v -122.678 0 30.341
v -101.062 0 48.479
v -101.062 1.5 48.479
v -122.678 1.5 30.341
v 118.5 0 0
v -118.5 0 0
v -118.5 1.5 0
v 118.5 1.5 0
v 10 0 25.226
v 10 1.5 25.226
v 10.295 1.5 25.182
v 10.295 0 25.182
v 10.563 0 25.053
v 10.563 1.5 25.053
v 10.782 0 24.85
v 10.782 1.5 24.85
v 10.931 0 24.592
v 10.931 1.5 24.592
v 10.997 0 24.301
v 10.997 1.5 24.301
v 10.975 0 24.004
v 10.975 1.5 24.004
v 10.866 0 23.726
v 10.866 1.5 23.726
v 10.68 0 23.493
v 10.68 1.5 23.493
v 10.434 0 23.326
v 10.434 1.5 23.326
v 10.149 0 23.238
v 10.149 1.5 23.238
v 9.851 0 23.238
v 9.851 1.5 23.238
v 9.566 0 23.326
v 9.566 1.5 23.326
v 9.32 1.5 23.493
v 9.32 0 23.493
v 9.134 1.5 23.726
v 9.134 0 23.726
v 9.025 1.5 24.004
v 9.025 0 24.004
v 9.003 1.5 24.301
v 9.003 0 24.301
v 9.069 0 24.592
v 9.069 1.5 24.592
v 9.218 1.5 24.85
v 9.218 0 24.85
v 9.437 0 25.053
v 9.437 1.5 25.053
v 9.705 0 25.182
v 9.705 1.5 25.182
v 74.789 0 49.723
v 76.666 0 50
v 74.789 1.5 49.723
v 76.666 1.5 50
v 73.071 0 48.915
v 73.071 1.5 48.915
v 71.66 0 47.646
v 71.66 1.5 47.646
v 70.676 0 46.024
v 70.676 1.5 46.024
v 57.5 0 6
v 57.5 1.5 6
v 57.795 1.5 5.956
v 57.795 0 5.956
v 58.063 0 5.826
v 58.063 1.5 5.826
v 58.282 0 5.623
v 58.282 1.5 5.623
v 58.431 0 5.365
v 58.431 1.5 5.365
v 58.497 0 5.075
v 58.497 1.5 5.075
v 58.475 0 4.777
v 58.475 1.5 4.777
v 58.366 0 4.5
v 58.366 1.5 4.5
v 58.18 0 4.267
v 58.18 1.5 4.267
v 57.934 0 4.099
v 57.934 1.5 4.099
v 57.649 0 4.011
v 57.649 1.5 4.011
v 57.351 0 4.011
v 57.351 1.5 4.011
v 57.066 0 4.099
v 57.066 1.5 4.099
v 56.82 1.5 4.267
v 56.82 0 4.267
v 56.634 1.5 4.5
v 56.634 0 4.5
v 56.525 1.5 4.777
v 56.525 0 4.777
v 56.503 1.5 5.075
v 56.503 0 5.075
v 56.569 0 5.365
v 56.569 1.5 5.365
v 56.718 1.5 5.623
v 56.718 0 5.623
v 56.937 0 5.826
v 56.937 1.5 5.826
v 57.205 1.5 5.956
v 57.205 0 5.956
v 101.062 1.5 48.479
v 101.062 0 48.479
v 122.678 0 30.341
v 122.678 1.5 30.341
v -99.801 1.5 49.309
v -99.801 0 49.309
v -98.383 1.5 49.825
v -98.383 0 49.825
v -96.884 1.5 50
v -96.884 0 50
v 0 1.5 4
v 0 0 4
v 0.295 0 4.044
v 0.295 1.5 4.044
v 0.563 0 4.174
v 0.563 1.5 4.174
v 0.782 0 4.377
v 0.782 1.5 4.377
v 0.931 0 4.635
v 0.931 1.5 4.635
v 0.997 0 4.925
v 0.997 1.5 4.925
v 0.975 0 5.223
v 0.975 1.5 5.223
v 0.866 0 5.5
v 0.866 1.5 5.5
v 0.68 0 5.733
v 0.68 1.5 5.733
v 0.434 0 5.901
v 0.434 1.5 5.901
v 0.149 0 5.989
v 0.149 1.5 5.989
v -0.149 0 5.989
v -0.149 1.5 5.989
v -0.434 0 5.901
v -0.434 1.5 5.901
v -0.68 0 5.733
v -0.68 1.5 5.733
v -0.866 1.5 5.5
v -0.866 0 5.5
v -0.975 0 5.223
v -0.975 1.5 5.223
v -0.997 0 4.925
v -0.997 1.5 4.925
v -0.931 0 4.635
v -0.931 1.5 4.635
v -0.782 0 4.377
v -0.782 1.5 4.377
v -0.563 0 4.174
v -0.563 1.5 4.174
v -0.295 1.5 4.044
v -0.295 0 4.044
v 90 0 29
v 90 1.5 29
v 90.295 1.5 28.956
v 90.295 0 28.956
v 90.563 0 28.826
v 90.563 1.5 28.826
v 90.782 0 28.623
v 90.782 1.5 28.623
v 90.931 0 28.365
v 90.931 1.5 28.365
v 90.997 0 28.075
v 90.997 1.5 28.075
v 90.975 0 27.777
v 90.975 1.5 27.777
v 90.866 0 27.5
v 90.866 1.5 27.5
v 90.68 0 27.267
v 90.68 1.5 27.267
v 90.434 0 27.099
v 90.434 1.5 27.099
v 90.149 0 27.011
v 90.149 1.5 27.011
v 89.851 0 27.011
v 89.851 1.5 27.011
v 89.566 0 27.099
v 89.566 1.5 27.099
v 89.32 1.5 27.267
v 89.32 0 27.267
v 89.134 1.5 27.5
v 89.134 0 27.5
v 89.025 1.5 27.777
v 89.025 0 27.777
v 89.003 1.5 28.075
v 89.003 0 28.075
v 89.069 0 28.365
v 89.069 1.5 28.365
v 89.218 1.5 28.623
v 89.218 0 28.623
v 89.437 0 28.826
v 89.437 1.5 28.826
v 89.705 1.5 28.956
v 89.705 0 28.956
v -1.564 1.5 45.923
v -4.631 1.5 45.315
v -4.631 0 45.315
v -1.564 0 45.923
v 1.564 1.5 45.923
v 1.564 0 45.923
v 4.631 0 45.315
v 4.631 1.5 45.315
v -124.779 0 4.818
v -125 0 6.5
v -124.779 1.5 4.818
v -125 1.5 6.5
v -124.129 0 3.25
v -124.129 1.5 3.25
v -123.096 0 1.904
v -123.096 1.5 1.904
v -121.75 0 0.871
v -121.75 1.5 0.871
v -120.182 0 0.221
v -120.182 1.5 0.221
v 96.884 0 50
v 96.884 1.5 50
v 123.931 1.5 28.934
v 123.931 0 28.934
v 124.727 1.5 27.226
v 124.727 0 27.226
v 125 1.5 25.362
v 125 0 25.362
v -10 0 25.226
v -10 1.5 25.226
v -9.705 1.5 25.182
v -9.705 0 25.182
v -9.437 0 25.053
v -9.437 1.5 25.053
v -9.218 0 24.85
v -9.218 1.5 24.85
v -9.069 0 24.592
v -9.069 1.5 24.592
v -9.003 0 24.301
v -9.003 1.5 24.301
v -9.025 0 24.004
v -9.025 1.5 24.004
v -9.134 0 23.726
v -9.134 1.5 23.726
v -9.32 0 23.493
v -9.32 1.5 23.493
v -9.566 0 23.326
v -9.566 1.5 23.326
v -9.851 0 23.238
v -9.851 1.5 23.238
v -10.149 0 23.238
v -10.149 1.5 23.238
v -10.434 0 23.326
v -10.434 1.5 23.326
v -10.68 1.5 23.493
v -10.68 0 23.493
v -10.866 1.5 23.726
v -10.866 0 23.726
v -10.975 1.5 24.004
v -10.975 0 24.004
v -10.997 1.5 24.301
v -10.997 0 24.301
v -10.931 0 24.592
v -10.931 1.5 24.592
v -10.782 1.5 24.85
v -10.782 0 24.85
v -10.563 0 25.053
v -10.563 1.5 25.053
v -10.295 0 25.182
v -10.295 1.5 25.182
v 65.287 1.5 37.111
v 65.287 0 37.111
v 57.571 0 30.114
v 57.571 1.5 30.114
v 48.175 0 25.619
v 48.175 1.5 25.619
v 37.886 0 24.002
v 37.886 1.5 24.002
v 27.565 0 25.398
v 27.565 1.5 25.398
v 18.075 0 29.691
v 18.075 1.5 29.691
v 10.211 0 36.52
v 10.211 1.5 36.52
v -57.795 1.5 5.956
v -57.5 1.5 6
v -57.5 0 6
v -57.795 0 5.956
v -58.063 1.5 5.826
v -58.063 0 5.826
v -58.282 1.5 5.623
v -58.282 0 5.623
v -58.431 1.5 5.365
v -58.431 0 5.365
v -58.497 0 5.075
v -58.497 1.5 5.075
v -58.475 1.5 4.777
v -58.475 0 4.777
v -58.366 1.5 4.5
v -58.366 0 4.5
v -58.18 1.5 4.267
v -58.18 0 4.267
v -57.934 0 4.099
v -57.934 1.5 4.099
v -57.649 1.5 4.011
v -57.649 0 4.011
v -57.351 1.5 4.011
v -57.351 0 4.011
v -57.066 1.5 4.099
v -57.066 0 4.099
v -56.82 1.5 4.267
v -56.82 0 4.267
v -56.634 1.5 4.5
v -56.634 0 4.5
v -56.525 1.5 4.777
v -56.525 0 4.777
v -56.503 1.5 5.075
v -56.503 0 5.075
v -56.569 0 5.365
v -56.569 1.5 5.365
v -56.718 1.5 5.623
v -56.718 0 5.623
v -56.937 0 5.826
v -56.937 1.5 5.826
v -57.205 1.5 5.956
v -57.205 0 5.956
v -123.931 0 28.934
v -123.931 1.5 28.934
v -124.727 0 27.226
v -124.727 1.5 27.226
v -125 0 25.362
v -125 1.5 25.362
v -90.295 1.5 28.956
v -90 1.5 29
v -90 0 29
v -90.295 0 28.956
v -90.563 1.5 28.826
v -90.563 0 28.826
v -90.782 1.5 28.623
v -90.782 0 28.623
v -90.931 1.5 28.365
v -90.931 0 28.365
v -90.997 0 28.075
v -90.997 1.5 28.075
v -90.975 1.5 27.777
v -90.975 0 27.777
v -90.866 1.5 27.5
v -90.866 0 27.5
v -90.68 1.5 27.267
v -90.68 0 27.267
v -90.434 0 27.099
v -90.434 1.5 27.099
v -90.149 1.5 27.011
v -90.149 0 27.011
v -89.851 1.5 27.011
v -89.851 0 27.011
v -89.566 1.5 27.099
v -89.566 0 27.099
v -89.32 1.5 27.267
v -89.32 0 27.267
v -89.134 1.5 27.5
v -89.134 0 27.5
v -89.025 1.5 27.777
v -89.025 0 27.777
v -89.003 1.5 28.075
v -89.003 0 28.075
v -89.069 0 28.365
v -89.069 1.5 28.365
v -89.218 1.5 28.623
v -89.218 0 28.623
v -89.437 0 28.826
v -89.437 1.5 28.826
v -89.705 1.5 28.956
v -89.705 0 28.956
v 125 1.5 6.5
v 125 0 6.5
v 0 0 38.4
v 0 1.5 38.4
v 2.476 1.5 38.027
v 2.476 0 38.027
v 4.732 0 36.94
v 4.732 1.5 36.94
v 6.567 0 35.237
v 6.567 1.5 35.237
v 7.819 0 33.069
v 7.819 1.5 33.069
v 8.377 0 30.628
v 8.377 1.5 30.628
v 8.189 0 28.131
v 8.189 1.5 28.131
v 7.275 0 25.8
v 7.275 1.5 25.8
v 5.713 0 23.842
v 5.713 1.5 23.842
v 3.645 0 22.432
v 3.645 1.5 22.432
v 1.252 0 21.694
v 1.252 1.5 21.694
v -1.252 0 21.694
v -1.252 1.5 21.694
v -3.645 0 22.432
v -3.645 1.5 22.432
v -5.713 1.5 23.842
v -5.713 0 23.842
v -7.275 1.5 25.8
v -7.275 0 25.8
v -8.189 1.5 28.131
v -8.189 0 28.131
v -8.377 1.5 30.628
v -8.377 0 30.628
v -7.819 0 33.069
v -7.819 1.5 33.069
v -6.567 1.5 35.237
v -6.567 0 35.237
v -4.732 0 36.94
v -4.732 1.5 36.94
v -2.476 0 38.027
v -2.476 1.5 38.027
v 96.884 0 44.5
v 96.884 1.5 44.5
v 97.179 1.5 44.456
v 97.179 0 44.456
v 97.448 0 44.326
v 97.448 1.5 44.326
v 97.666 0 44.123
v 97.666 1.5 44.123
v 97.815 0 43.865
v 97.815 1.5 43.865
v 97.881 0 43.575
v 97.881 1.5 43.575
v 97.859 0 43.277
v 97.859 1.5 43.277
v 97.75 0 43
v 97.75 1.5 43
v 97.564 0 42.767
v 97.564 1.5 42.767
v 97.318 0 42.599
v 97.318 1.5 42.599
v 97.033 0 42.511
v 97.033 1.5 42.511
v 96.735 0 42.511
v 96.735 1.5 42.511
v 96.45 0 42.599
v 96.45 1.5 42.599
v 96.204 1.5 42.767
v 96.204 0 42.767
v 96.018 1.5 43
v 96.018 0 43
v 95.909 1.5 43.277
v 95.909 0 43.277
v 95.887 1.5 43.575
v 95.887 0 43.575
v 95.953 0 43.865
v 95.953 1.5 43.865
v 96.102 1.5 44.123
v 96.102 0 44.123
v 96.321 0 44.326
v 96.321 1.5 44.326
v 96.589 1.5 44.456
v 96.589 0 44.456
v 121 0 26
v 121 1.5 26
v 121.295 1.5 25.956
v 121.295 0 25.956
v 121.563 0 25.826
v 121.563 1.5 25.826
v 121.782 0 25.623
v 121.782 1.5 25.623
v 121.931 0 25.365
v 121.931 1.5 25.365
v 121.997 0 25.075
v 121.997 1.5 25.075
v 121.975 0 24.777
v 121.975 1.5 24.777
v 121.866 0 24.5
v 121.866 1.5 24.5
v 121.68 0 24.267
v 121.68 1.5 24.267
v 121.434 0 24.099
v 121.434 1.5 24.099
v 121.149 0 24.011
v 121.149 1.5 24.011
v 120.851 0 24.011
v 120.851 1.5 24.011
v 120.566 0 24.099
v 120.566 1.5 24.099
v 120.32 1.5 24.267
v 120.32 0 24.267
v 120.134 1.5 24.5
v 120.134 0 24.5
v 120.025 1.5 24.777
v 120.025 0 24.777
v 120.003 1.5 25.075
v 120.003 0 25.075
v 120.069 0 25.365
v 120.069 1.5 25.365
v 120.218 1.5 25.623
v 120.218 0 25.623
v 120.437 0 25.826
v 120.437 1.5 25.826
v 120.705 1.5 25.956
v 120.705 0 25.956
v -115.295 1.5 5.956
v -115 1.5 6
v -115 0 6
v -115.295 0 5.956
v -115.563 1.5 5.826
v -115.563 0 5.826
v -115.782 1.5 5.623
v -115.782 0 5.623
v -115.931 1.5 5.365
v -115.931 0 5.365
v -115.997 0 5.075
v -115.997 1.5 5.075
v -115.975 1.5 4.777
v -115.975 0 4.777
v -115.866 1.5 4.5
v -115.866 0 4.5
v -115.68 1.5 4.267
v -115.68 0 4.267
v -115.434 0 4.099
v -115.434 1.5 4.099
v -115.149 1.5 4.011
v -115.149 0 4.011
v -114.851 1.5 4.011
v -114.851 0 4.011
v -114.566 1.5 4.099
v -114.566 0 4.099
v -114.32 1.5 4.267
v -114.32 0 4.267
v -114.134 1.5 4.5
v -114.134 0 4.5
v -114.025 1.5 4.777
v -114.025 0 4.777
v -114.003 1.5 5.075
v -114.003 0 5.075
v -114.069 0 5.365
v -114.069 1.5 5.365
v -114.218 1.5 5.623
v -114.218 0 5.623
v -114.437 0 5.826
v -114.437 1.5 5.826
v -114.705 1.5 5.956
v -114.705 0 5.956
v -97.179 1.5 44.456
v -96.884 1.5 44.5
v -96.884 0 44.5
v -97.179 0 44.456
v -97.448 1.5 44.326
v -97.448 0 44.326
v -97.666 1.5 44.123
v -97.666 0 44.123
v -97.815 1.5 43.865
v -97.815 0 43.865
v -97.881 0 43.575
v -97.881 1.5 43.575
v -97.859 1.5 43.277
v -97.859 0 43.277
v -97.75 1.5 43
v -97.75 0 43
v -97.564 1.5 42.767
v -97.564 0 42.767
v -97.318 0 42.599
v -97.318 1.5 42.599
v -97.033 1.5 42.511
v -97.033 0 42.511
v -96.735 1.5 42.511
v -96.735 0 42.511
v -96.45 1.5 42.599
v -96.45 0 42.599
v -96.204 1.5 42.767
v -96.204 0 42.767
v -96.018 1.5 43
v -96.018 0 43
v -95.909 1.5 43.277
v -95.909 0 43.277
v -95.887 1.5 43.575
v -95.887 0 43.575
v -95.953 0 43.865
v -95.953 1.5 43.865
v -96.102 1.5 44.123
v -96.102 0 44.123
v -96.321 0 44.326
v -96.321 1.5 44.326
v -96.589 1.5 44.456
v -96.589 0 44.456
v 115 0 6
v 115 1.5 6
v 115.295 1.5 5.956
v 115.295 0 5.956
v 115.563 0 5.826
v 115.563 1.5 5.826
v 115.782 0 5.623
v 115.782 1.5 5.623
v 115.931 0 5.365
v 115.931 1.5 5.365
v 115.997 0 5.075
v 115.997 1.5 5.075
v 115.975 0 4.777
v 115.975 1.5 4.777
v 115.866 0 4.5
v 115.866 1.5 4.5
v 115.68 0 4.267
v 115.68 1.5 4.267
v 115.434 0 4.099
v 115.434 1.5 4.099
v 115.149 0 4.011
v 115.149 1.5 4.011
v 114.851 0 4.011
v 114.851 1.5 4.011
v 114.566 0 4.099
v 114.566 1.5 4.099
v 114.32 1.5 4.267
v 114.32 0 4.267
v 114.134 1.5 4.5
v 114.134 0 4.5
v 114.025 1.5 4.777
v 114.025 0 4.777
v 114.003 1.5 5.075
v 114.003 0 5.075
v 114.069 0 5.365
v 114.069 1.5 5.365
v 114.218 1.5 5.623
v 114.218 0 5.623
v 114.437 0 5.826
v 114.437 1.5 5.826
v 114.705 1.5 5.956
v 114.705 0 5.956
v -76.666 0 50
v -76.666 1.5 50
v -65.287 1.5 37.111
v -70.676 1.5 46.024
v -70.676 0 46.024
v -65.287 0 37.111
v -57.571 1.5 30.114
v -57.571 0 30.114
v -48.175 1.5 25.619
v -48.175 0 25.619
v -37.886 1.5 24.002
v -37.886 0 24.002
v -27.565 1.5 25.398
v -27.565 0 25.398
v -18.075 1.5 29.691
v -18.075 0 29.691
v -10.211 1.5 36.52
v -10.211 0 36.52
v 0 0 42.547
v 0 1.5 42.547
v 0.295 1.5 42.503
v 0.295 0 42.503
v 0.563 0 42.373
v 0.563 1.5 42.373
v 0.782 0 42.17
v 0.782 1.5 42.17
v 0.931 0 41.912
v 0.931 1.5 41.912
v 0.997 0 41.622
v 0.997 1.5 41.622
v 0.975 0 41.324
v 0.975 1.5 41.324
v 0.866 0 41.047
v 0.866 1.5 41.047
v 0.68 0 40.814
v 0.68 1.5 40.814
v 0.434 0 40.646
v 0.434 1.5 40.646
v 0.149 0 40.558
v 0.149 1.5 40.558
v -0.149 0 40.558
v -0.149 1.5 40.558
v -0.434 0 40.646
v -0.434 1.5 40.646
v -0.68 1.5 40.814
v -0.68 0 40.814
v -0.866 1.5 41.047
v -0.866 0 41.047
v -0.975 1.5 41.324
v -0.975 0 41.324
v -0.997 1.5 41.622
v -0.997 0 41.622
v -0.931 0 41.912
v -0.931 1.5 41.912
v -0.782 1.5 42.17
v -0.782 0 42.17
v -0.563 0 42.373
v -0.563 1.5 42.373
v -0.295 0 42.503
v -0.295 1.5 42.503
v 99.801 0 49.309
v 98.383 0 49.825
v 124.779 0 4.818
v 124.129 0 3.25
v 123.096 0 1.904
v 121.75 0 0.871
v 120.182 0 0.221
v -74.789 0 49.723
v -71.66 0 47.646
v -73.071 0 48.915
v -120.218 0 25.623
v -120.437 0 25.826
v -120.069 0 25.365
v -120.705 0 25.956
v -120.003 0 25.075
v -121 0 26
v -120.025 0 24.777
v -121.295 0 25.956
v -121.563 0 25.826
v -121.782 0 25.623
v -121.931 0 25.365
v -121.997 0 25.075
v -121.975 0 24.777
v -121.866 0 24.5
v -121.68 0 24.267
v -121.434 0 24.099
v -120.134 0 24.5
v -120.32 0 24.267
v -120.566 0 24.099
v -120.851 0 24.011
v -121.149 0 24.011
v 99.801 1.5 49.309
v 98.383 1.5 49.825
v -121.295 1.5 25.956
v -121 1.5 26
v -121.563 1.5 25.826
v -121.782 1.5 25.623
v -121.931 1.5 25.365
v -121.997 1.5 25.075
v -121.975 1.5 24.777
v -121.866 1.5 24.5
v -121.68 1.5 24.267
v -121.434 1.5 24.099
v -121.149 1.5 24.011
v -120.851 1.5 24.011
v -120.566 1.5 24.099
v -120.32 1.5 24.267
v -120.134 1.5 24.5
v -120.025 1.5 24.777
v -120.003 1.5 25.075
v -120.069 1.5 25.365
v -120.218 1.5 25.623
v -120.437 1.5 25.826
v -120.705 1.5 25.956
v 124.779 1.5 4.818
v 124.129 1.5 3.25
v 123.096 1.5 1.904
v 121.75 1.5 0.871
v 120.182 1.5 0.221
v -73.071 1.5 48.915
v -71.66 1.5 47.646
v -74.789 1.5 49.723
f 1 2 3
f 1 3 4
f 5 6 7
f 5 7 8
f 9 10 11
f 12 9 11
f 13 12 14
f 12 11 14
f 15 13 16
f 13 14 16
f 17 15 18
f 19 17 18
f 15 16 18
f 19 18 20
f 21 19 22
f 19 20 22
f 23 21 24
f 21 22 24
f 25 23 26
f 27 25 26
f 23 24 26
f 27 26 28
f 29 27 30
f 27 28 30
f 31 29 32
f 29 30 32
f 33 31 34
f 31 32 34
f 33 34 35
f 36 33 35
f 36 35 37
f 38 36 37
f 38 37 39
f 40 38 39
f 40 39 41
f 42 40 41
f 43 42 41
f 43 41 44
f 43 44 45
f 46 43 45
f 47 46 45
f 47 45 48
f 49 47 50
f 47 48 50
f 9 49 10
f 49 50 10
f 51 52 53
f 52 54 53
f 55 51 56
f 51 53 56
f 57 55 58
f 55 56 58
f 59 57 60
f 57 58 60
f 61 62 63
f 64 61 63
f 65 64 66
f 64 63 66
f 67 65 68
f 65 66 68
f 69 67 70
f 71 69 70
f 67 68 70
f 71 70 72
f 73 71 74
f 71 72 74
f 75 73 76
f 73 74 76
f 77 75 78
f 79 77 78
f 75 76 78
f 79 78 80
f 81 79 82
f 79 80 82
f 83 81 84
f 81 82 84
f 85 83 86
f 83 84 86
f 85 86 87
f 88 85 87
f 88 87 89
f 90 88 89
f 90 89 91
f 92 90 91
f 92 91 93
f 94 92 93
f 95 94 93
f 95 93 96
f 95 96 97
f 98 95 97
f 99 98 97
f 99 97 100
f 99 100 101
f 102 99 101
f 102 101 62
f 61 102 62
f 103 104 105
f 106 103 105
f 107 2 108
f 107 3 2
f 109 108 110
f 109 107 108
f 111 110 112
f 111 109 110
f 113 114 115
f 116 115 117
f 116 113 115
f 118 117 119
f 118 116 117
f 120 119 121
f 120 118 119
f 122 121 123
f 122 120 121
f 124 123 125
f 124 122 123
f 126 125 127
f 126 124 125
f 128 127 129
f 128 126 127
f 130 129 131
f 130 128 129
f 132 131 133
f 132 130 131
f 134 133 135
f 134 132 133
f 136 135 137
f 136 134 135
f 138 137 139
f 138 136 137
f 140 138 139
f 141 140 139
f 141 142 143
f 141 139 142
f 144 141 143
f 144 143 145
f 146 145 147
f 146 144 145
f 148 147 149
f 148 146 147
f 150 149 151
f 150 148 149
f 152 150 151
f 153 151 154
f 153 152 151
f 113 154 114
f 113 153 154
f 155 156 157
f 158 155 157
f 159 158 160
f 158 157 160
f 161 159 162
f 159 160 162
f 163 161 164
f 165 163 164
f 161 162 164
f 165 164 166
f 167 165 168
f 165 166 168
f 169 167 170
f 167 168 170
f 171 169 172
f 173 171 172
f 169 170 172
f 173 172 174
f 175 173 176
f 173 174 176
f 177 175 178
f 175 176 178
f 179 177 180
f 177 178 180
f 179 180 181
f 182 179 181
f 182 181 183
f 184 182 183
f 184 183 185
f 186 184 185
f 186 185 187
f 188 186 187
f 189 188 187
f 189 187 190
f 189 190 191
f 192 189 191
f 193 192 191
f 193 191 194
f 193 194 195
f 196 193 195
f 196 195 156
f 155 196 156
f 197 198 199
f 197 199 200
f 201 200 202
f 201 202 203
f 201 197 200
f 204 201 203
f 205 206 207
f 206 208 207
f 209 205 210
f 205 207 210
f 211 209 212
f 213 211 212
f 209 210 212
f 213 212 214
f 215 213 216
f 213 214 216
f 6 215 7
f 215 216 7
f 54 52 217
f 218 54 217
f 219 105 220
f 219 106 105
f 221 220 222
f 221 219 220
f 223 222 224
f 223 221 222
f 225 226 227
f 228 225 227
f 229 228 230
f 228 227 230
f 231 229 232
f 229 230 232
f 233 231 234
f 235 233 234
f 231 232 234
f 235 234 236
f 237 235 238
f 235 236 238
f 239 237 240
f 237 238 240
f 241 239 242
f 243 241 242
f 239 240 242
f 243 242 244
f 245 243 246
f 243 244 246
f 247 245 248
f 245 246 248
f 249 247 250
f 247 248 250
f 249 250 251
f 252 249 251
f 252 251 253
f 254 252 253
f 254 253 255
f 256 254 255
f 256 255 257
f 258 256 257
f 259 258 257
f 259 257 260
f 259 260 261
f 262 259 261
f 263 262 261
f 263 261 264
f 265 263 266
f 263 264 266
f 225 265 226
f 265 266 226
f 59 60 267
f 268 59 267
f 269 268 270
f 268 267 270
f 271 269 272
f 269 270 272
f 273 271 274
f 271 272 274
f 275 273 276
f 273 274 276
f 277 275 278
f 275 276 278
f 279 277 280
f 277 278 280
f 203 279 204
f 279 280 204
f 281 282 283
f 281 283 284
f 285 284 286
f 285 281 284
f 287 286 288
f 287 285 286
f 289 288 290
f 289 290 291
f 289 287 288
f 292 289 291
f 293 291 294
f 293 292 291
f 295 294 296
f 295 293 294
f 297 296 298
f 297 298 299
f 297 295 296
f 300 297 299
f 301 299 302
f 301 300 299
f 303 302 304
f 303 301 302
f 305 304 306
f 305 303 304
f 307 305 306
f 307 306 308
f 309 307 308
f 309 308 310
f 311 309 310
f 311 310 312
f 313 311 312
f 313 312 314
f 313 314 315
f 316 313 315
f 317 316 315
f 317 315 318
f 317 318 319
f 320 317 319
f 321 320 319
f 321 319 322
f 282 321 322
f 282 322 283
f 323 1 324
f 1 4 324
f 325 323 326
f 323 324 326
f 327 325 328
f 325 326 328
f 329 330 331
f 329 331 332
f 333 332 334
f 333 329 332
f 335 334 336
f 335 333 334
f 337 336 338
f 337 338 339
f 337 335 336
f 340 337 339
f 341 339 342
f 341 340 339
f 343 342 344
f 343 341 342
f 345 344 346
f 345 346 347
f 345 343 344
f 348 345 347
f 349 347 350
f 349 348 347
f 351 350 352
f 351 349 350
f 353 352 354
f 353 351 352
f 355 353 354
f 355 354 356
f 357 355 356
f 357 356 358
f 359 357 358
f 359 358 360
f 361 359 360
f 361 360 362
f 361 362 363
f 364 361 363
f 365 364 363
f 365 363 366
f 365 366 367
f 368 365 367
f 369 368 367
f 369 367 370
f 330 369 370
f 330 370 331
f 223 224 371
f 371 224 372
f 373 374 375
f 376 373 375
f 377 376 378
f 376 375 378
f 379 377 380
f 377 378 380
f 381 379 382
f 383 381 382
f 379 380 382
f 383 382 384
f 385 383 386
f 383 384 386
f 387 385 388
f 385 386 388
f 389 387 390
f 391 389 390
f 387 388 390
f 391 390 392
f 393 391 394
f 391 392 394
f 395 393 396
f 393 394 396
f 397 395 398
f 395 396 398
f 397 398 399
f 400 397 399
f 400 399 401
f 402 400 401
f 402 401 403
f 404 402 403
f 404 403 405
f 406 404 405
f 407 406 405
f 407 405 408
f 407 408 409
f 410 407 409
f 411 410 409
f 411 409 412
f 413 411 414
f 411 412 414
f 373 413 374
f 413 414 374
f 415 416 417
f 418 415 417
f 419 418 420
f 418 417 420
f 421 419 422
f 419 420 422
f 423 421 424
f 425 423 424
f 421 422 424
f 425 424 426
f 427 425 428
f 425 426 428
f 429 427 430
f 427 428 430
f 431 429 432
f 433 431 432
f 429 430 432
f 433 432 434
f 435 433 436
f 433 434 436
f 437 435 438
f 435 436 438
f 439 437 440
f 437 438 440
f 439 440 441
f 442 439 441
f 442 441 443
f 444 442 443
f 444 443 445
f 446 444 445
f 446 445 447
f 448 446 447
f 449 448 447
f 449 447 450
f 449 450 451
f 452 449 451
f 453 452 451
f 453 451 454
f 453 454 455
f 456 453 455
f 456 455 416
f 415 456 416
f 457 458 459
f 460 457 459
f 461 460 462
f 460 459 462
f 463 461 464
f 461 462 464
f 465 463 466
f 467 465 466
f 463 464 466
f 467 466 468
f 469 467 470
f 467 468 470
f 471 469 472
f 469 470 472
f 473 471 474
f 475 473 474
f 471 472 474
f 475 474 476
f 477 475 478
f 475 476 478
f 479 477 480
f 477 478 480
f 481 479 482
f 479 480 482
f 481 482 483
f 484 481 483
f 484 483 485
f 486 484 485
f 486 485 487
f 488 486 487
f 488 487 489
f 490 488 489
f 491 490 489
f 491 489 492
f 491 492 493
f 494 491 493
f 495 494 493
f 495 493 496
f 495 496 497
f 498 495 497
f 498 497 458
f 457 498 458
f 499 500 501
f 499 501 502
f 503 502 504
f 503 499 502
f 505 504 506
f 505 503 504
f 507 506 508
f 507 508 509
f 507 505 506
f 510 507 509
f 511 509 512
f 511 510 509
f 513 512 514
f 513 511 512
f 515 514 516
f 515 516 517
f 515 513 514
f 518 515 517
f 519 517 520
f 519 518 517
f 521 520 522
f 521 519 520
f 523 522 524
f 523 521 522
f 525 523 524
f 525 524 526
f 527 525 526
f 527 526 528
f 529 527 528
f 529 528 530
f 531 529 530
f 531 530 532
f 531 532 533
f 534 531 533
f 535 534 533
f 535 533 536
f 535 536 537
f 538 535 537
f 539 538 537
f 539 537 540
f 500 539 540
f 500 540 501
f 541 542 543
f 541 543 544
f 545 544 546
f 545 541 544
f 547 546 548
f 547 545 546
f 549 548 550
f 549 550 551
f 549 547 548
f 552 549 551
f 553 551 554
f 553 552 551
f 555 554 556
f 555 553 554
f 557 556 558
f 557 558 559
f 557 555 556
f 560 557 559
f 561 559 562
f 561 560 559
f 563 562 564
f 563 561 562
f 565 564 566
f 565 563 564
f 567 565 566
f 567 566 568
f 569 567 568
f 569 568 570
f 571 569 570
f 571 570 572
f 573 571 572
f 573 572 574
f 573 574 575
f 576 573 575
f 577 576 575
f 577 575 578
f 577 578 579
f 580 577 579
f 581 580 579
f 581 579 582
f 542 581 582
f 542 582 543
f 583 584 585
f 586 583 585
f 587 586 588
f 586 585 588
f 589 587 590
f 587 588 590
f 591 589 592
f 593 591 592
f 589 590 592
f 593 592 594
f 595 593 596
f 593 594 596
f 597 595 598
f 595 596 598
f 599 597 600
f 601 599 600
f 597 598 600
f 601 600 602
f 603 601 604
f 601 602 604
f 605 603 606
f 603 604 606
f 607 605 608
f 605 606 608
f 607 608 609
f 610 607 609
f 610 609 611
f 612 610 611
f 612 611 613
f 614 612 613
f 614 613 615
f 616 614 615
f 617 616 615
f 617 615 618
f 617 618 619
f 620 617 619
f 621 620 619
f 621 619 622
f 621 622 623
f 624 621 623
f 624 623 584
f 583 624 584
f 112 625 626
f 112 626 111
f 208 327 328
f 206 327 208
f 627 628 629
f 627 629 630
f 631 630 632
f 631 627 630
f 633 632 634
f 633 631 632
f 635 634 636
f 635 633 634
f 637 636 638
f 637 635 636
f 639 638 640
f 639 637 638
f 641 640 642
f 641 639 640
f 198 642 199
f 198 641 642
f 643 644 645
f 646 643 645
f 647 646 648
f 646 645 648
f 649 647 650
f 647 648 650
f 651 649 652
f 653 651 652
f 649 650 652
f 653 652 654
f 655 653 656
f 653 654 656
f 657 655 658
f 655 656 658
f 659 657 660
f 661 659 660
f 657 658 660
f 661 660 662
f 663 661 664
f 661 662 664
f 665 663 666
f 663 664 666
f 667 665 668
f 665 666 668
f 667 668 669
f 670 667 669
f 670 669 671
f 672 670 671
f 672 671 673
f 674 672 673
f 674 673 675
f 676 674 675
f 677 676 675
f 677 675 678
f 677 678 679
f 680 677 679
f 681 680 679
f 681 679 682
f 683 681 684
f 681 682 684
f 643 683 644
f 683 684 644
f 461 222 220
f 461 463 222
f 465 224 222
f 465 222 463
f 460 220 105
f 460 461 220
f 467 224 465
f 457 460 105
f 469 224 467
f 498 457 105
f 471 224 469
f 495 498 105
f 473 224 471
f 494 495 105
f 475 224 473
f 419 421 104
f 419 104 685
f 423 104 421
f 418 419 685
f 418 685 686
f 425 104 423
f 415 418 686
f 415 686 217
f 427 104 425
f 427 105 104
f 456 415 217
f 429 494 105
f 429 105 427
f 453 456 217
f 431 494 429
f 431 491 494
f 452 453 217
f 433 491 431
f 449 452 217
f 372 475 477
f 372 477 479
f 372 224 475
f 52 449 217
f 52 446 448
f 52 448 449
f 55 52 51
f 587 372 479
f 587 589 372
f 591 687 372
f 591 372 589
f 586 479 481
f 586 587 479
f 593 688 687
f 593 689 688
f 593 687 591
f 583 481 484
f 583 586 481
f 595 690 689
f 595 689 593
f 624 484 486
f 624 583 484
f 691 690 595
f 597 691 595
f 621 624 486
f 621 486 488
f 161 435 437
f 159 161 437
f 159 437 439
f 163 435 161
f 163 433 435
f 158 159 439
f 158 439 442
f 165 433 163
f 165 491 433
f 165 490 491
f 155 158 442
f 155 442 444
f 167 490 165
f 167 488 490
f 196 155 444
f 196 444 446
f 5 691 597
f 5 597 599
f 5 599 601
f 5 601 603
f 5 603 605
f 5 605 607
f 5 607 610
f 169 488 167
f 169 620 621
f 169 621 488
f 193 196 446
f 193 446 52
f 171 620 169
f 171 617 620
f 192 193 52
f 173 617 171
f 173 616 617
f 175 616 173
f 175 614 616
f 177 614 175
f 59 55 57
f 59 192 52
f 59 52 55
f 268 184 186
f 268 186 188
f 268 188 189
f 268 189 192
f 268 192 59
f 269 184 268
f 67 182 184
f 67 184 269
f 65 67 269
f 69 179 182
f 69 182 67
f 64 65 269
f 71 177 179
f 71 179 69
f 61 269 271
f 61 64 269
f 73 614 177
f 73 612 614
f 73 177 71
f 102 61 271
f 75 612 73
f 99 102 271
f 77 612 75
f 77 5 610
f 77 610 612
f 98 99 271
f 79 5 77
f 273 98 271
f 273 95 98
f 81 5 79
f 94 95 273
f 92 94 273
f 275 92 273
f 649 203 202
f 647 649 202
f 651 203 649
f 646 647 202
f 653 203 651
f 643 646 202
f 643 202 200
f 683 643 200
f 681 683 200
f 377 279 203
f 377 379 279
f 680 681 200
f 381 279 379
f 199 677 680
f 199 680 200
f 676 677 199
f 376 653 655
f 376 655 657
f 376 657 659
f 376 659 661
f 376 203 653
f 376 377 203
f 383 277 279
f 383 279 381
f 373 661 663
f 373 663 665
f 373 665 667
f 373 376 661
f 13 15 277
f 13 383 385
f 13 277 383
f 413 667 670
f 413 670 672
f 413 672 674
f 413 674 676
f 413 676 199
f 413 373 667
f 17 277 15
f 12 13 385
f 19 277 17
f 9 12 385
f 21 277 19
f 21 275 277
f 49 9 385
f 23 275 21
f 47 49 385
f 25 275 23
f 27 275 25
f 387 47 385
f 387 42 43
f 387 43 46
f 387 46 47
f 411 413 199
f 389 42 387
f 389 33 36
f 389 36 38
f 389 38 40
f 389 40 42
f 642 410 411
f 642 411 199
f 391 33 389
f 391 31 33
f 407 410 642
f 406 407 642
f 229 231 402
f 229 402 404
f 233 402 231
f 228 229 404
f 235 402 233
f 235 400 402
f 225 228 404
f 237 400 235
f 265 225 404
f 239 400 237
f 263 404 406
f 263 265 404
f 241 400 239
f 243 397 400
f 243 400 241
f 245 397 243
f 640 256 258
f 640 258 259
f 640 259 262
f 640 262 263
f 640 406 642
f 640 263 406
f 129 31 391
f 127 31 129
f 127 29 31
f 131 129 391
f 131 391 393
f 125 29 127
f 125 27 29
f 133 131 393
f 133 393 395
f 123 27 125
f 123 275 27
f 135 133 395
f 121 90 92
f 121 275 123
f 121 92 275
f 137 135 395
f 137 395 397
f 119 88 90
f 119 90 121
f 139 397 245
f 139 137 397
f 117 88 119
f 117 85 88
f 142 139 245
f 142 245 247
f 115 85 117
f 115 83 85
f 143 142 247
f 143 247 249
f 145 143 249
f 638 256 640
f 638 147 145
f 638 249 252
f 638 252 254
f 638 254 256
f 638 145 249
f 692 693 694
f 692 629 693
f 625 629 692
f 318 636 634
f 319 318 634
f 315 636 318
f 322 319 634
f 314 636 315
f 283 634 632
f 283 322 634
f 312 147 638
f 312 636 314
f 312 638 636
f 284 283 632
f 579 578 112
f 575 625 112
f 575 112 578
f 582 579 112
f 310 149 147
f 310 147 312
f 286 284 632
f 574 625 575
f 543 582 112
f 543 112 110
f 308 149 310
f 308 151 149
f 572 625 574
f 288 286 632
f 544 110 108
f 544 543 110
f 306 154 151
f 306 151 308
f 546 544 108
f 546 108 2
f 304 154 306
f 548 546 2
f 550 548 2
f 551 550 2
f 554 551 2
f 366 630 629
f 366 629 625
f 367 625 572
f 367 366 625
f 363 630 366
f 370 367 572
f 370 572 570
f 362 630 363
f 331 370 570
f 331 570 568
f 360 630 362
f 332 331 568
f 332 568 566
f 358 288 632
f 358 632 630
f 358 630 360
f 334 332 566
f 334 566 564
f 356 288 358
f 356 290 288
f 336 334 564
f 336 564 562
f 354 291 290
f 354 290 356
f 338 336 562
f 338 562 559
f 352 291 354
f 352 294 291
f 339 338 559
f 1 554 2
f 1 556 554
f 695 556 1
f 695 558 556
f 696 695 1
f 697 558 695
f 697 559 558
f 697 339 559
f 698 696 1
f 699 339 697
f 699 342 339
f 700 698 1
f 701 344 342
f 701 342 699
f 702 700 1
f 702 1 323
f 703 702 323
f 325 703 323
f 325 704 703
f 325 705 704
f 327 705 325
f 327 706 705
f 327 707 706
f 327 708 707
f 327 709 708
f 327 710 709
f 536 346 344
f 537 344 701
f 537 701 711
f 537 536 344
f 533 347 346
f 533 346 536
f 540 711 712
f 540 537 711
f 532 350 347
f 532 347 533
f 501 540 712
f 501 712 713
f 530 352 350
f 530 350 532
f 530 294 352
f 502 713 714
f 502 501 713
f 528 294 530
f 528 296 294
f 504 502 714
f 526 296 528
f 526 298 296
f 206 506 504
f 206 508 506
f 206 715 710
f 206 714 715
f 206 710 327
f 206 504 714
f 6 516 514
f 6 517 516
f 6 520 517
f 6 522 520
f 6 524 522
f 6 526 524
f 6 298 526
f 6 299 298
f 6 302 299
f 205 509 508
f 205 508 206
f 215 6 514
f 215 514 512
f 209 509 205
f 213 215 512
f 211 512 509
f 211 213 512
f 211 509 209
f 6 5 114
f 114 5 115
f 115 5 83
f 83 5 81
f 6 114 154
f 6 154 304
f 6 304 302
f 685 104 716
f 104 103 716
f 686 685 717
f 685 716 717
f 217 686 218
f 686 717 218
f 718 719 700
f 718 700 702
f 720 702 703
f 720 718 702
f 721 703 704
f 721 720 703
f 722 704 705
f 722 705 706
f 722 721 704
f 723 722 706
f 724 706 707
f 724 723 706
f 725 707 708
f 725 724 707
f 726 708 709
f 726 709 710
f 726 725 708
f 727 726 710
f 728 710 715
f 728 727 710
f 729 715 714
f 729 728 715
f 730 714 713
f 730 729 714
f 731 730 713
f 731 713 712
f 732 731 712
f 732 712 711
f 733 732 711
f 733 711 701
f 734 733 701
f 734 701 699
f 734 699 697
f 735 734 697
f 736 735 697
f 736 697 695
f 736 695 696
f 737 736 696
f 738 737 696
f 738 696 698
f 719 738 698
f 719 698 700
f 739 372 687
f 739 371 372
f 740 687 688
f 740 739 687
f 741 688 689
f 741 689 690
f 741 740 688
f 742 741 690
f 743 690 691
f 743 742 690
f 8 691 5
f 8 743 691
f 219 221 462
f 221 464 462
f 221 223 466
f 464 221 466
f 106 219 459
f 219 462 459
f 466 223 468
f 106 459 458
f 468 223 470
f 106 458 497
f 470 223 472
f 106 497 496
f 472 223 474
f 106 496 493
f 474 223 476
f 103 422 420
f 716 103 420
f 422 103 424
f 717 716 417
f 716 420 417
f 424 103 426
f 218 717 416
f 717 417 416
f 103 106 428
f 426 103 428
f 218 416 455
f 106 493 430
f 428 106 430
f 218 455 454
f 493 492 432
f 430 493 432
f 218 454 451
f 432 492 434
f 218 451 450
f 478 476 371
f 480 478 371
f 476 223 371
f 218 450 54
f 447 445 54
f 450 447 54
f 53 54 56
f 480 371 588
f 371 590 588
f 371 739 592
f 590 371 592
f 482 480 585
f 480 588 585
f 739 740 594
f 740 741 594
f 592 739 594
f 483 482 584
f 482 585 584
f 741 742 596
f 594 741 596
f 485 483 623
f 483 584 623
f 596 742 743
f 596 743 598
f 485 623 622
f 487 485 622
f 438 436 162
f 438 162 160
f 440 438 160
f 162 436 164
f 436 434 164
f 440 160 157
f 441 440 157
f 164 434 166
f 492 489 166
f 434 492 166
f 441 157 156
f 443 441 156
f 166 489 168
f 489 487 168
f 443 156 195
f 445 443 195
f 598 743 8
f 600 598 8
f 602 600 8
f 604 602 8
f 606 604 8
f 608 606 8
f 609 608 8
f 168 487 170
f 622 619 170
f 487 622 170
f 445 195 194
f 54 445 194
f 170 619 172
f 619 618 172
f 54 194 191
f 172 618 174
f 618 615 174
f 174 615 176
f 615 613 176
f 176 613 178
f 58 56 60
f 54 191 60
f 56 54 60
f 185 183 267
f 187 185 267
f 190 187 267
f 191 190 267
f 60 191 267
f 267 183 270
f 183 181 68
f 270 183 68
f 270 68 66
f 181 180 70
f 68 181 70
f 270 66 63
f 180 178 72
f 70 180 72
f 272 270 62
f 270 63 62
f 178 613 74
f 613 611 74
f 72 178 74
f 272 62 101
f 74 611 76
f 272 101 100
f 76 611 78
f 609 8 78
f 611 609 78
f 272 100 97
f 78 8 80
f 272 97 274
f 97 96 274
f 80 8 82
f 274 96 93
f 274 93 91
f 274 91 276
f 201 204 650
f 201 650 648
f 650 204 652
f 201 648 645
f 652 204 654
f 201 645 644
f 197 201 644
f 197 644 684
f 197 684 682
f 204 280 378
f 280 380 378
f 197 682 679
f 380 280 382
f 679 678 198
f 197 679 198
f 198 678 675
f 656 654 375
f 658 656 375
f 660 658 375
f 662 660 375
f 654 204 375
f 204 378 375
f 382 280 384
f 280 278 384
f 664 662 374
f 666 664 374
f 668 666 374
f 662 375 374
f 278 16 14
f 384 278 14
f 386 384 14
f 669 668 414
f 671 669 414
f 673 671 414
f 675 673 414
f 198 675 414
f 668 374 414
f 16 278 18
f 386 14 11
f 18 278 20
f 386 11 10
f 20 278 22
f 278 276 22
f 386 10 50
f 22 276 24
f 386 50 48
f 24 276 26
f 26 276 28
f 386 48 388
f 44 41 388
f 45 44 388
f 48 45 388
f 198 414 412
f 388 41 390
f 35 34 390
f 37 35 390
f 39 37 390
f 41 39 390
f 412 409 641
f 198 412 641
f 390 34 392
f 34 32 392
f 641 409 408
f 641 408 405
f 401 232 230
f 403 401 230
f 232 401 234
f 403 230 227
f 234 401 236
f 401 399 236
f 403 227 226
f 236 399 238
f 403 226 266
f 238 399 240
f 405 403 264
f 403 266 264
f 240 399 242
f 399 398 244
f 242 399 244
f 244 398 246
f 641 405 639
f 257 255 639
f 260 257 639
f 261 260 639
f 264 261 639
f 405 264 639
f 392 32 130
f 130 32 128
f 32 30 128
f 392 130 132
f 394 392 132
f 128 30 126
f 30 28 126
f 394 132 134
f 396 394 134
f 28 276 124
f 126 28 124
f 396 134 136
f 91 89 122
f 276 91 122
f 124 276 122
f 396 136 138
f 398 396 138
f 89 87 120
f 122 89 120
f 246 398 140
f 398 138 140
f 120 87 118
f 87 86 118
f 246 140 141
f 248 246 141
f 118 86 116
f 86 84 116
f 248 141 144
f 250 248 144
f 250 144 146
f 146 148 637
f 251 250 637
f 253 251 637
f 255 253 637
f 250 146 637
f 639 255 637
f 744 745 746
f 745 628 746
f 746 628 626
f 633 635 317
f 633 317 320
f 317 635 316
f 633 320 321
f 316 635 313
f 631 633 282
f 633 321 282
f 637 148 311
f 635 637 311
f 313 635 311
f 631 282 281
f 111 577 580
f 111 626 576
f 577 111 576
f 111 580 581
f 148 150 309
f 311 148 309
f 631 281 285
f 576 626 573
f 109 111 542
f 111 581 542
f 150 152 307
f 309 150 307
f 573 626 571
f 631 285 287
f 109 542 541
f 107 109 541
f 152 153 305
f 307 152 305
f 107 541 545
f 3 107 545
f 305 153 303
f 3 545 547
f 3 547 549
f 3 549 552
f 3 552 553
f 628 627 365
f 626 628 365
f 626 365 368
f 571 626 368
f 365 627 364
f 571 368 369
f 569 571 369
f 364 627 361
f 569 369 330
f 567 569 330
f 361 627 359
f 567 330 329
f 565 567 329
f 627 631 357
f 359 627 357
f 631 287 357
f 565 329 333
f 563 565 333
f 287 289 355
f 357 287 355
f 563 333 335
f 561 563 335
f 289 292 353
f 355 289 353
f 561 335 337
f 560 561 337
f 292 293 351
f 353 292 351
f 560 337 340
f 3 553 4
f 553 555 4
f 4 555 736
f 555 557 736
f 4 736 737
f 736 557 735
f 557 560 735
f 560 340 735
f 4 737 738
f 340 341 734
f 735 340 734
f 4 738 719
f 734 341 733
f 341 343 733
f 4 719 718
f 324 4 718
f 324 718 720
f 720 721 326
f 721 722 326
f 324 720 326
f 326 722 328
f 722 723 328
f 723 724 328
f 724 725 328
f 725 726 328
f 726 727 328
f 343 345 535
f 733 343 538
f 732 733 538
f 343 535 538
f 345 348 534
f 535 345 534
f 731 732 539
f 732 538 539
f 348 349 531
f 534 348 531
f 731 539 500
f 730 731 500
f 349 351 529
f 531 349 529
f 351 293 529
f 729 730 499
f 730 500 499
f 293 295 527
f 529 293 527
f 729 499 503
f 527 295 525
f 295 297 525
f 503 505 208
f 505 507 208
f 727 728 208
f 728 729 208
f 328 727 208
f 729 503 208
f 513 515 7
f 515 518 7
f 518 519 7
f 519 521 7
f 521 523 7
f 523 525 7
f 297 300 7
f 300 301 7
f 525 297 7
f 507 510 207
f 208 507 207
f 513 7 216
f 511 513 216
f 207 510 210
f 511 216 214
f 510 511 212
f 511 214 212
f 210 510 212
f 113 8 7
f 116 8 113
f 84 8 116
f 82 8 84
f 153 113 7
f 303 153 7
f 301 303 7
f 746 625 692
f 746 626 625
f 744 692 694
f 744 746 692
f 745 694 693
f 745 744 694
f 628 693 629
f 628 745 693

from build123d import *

# Parameters (mm, degrees)
BOSS_EXTRU_1_DEPTH      = 1.5
ESQUISSE2_R             = 1
ENL_V_MAT_EXTRU_1_DEPTH = 135.637476209
ESQUISSE4_R             = 36
ENL_V_MAT_EXTRU_3_DEPTH = 135.637476209
CONG_1_R                = 6.5
ESQUISSE3_R             = 8.4
ESQUISSE3_R_2           = 1
ENL_V_MAT_EXTRU_2_DEPTH = 1.5
ENL_V_MAT_EXTRU_4_DEPTH = 135.637476209


with BuildPart() as part:
    # Esquisse1 → Boss.-Extru.1 (new body)
    with BuildSketch(Plane(origin=(0, 0, 0), x_dir=(1, 0, 0), z_dir=(0, 1, 0))):
        Polygon((99.25, -50), (125, -28.393184497), (125, 0), (0, 0), (0, -50), align=None)
    extrude(amount=BOSS_EXTRU_1_DEPTH)

    # Esquisse2 → Enlèv. mat.-Extru.1 (cut, through all)
    with BuildSketch(Plane(origin=(0, 1.5, 0), x_dir=(1, 0, 0), z_dir=(0, 1, 0))):
        with Locations((0, -5)):
            Circle(ESQUISSE2_R)
        with Locations(Location((57.5, -5, 0), (0, 0, 270))):
            Circle(ESQUISSE2_R)
        with Locations(Location((115, -5, 0), (0, 0, 270))):
            Circle(ESQUISSE2_R)
        with Locations(Location((96.884193477, -43.5, 0), (0, 0, 270))):
            Circle(ESQUISSE2_R)
        with Locations(Location((90, -28, 0), (0, 0, 270))):
            Circle(ESQUISSE2_R)
        with Locations(Location((121, -25, 0), (0, 0, 270))):
            Circle(ESQUISSE2_R)
    extrude(amount=-ENL_V_MAT_EXTRU_1_DEPTH, mode=Mode.SUBTRACT)

    # Esquisse4 → Enlèv. mat.-Extru.3 (cut, through all)
    with BuildSketch(Plane(origin=(0, 1.5, 0), x_dir=(1, 0, 0), z_dir=(0, 1, 0))):
        with Locations((37.5, -60)):
            Circle(ESQUISSE4_R)
    extrude(amount=-ENL_V_MAT_EXTRU_3_DEPTH, mode=Mode.SUBTRACT)

    # Congé1
    cong_1_edges = [part.edges().sort_by_distance(p)[0] for p in [
        (125, 0.75, 28.393184497),
        (99.25, 0.75, 50),
        (125, 0.75, 0),
        (72.083232932, 0.75, 50),
    ]]
    fillet(cong_1_edges, radius=CONG_1_R)

    # Symétrie1: part across plane


with BuildPart() as part_1:
    add(part.part)
    add(part.part.mirror(Plane(origin=(0, 0, 0), x_dir=(0, 0, 1), z_dir=(1, 0, 0))))

    # Esquisse3 → Enlèv. mat.-Extru.2 (cut)
    with BuildSketch(Plane(origin=(0, 1.5, 0), x_dir=(1, 0, 0), z_dir=(0, 1, 0))):
        with Locations(Location((0, -30, 0), (0, 0, 270))):
            Circle(ESQUISSE3_R)
        with Locations(Location((0, -41.547005384, 0), (0, 0, 270))):
            Circle(ESQUISSE3_R_2)
        with Locations(Location((-10, -24.226497308, 0), (0, 0, 270))):
            Circle(ESQUISSE3_R_2)
        with Locations(Location((10, -24.226497308, 0), (0, 0, 270))):
            Circle(ESQUISSE3_R_2)
    extrude(amount=-ENL_V_MAT_EXTRU_2_DEPTH, mode=Mode.SUBTRACT)

    # Esquisse5 → Enlèv. mat.-Extru.4 (cut, through all)
    with BuildSketch(Plane(origin=(0, 1.5, 0), x_dir=(1, 0, 0), z_dir=(0, 1, 0))):
        with BuildLine():
            Line((7.702133216, -44.02416286), (7.702133216, -51.975452854))
            Line((7.702133216, -51.975452854), (-8.276969641, -51.975452854))
            Line((-8.276969641, -51.975452854), (-6.500509259, -44.619965095))
            ThreePointArc((-6.500509259, -44.619965095), (0.670611742, -45.985940069), (7.702133216, -44.02416286))
        make_face()
    extrude(amount=-ENL_V_MAT_EXTRU_4_DEPTH, mode=Mode.SUBTRACT)


solid = part_1.part
